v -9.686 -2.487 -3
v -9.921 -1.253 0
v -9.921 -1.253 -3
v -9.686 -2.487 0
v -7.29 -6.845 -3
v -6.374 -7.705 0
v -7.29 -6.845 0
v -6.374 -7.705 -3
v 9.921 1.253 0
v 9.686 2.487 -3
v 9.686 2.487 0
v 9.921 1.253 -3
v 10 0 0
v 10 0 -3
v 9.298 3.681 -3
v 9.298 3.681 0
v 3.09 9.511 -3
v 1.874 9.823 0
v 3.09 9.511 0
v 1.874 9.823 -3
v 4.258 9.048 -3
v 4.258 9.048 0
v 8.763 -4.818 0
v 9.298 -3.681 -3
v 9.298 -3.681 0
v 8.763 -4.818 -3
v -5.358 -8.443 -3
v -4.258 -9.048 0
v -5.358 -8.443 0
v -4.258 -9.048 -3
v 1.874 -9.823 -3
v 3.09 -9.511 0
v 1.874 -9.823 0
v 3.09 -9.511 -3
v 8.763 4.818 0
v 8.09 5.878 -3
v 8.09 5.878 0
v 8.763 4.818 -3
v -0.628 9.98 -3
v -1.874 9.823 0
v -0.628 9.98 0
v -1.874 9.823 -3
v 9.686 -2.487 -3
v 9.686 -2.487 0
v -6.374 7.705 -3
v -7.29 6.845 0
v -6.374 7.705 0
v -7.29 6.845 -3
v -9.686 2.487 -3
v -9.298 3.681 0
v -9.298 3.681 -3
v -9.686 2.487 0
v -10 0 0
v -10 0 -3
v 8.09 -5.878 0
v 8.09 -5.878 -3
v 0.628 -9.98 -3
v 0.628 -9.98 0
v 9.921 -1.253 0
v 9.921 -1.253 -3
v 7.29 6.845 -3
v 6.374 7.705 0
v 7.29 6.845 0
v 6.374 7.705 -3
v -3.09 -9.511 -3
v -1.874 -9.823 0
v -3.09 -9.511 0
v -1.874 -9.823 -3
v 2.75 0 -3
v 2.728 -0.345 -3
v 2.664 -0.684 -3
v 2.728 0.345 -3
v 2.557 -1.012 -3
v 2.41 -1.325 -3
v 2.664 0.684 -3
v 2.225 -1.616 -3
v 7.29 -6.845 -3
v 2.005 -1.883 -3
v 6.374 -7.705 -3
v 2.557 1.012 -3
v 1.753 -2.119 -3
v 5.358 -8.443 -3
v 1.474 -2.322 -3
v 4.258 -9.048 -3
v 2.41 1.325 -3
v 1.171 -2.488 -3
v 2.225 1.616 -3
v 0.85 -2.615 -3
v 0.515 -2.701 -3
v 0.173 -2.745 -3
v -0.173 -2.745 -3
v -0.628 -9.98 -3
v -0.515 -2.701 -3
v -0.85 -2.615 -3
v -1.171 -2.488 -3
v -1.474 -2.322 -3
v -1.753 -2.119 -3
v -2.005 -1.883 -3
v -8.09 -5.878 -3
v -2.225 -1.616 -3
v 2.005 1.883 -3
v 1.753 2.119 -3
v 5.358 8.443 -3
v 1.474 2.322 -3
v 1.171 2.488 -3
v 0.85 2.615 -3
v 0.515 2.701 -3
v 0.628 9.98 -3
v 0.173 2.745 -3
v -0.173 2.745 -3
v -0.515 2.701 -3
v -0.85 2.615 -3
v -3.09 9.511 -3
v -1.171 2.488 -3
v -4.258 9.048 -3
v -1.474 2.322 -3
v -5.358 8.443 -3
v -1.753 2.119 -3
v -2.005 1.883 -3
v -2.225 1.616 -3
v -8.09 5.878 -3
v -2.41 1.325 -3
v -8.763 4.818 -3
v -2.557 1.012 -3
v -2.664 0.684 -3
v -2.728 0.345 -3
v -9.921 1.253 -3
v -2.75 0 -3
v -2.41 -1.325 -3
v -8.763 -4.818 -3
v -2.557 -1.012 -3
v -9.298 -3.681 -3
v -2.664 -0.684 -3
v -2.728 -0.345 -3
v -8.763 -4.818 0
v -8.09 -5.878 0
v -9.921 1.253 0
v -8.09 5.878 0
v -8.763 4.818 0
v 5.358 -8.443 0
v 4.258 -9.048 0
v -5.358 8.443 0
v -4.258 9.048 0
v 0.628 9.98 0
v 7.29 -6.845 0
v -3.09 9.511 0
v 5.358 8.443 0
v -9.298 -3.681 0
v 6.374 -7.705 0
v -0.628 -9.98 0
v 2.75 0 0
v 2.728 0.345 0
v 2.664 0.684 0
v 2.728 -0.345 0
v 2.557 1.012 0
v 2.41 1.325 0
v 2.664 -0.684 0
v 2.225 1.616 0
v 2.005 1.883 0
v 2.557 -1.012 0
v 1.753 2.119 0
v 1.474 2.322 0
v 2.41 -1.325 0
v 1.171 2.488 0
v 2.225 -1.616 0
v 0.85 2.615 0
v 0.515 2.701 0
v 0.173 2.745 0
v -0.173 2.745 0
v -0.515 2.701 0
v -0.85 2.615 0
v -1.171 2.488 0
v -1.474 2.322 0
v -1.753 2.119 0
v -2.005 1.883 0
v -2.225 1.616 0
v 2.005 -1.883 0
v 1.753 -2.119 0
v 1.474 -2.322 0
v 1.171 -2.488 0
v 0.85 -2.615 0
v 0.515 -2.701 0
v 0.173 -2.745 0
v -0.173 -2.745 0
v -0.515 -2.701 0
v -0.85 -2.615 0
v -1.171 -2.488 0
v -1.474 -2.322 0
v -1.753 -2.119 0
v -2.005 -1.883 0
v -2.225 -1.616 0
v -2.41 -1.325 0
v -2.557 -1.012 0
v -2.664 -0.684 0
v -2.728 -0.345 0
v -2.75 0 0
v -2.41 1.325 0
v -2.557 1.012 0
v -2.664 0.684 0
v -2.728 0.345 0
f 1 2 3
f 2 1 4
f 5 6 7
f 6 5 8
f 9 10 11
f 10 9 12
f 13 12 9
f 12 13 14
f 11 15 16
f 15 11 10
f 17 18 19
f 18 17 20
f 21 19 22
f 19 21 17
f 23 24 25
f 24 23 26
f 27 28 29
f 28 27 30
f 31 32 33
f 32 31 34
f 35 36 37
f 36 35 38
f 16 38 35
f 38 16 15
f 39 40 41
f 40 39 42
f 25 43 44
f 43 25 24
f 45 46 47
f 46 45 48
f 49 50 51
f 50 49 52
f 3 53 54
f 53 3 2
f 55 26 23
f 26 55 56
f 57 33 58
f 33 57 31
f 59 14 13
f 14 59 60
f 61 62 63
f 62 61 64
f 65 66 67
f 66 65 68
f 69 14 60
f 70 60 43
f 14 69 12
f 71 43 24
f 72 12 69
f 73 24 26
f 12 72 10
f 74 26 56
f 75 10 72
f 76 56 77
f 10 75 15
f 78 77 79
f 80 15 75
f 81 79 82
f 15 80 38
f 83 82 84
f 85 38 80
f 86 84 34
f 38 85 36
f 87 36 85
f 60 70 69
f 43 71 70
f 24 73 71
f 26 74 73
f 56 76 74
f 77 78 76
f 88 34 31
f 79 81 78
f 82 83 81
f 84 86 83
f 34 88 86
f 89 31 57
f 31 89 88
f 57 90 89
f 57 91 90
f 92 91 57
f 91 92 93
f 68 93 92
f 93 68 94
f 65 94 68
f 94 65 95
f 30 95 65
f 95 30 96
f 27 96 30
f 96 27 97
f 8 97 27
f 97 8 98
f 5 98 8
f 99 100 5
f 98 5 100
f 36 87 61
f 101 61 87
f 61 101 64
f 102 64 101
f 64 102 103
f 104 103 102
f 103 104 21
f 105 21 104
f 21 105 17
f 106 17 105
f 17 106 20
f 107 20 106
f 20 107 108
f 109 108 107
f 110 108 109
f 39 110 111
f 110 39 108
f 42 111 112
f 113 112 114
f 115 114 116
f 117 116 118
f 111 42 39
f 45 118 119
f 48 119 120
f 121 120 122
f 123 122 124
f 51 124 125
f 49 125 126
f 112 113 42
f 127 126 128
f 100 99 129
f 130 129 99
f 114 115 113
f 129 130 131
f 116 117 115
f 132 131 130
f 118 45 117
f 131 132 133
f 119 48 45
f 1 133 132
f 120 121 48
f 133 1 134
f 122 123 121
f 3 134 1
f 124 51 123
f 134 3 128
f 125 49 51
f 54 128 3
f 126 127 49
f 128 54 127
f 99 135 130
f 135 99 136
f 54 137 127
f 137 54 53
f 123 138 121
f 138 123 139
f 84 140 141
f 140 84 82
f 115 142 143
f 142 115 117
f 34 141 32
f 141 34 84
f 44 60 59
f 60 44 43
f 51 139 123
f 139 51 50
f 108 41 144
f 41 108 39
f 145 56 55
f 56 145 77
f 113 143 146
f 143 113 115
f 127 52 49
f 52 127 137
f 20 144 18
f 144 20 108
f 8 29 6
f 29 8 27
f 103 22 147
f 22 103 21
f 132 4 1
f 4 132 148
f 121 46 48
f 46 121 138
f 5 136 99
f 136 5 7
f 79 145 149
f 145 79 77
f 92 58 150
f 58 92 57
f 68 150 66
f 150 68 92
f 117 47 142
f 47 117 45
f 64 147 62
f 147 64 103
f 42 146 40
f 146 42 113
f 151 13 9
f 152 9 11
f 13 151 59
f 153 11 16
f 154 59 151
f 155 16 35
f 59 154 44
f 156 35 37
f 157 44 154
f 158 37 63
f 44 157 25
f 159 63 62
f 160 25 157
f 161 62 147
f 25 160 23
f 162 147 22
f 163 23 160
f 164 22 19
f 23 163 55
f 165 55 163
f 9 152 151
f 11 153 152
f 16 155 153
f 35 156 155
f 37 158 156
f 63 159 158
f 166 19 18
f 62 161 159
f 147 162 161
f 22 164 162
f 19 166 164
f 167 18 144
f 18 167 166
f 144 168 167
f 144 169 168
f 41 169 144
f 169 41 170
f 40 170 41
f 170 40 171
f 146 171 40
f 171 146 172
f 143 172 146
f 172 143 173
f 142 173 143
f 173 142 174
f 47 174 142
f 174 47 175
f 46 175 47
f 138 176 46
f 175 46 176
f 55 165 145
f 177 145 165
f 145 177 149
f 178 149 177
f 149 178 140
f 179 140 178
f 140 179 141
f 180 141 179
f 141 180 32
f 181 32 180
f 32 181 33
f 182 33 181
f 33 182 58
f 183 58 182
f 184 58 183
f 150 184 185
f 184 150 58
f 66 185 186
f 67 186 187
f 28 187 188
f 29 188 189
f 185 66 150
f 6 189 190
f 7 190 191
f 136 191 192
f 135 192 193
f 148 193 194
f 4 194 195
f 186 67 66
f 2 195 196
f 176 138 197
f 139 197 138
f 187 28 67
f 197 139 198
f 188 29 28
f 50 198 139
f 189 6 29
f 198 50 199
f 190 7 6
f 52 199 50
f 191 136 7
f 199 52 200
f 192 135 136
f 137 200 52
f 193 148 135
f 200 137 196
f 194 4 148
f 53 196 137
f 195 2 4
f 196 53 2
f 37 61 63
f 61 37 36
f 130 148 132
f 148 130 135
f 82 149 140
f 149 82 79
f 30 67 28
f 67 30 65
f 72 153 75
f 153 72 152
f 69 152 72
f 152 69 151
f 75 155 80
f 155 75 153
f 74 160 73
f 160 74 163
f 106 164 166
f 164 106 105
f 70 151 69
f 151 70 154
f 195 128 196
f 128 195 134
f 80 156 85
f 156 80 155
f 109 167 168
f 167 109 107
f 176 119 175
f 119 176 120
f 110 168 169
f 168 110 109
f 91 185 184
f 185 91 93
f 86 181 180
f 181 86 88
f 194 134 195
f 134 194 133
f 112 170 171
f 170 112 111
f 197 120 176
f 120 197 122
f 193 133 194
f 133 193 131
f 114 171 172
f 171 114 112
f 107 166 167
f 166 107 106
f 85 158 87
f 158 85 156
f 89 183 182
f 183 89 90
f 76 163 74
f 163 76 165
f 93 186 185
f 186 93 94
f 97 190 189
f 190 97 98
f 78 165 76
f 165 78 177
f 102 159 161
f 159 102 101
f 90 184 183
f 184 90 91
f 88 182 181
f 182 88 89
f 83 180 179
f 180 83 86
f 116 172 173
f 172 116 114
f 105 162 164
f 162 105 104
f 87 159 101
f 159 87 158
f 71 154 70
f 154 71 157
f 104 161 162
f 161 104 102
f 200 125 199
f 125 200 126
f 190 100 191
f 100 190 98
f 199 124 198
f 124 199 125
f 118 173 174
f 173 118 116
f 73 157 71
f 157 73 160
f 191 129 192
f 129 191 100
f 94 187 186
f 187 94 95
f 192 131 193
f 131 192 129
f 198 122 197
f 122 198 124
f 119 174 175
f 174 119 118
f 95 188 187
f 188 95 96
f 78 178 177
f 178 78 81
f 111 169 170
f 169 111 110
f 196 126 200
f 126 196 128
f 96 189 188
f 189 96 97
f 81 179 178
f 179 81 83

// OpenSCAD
$fn = 50;


difference() {
	union() {
		translate(v = [0, 0, -3.0000000000]) {
			cylinder(h = 3, r = 10.0000000000);
		}
		cylinder(h = 0, r = 20.0000000000);
	}
	union() {
		#translate(v = [0, 0, -3]) {
			cylinder(h = 3, r = 2.7500000000);
		}
	}
}
